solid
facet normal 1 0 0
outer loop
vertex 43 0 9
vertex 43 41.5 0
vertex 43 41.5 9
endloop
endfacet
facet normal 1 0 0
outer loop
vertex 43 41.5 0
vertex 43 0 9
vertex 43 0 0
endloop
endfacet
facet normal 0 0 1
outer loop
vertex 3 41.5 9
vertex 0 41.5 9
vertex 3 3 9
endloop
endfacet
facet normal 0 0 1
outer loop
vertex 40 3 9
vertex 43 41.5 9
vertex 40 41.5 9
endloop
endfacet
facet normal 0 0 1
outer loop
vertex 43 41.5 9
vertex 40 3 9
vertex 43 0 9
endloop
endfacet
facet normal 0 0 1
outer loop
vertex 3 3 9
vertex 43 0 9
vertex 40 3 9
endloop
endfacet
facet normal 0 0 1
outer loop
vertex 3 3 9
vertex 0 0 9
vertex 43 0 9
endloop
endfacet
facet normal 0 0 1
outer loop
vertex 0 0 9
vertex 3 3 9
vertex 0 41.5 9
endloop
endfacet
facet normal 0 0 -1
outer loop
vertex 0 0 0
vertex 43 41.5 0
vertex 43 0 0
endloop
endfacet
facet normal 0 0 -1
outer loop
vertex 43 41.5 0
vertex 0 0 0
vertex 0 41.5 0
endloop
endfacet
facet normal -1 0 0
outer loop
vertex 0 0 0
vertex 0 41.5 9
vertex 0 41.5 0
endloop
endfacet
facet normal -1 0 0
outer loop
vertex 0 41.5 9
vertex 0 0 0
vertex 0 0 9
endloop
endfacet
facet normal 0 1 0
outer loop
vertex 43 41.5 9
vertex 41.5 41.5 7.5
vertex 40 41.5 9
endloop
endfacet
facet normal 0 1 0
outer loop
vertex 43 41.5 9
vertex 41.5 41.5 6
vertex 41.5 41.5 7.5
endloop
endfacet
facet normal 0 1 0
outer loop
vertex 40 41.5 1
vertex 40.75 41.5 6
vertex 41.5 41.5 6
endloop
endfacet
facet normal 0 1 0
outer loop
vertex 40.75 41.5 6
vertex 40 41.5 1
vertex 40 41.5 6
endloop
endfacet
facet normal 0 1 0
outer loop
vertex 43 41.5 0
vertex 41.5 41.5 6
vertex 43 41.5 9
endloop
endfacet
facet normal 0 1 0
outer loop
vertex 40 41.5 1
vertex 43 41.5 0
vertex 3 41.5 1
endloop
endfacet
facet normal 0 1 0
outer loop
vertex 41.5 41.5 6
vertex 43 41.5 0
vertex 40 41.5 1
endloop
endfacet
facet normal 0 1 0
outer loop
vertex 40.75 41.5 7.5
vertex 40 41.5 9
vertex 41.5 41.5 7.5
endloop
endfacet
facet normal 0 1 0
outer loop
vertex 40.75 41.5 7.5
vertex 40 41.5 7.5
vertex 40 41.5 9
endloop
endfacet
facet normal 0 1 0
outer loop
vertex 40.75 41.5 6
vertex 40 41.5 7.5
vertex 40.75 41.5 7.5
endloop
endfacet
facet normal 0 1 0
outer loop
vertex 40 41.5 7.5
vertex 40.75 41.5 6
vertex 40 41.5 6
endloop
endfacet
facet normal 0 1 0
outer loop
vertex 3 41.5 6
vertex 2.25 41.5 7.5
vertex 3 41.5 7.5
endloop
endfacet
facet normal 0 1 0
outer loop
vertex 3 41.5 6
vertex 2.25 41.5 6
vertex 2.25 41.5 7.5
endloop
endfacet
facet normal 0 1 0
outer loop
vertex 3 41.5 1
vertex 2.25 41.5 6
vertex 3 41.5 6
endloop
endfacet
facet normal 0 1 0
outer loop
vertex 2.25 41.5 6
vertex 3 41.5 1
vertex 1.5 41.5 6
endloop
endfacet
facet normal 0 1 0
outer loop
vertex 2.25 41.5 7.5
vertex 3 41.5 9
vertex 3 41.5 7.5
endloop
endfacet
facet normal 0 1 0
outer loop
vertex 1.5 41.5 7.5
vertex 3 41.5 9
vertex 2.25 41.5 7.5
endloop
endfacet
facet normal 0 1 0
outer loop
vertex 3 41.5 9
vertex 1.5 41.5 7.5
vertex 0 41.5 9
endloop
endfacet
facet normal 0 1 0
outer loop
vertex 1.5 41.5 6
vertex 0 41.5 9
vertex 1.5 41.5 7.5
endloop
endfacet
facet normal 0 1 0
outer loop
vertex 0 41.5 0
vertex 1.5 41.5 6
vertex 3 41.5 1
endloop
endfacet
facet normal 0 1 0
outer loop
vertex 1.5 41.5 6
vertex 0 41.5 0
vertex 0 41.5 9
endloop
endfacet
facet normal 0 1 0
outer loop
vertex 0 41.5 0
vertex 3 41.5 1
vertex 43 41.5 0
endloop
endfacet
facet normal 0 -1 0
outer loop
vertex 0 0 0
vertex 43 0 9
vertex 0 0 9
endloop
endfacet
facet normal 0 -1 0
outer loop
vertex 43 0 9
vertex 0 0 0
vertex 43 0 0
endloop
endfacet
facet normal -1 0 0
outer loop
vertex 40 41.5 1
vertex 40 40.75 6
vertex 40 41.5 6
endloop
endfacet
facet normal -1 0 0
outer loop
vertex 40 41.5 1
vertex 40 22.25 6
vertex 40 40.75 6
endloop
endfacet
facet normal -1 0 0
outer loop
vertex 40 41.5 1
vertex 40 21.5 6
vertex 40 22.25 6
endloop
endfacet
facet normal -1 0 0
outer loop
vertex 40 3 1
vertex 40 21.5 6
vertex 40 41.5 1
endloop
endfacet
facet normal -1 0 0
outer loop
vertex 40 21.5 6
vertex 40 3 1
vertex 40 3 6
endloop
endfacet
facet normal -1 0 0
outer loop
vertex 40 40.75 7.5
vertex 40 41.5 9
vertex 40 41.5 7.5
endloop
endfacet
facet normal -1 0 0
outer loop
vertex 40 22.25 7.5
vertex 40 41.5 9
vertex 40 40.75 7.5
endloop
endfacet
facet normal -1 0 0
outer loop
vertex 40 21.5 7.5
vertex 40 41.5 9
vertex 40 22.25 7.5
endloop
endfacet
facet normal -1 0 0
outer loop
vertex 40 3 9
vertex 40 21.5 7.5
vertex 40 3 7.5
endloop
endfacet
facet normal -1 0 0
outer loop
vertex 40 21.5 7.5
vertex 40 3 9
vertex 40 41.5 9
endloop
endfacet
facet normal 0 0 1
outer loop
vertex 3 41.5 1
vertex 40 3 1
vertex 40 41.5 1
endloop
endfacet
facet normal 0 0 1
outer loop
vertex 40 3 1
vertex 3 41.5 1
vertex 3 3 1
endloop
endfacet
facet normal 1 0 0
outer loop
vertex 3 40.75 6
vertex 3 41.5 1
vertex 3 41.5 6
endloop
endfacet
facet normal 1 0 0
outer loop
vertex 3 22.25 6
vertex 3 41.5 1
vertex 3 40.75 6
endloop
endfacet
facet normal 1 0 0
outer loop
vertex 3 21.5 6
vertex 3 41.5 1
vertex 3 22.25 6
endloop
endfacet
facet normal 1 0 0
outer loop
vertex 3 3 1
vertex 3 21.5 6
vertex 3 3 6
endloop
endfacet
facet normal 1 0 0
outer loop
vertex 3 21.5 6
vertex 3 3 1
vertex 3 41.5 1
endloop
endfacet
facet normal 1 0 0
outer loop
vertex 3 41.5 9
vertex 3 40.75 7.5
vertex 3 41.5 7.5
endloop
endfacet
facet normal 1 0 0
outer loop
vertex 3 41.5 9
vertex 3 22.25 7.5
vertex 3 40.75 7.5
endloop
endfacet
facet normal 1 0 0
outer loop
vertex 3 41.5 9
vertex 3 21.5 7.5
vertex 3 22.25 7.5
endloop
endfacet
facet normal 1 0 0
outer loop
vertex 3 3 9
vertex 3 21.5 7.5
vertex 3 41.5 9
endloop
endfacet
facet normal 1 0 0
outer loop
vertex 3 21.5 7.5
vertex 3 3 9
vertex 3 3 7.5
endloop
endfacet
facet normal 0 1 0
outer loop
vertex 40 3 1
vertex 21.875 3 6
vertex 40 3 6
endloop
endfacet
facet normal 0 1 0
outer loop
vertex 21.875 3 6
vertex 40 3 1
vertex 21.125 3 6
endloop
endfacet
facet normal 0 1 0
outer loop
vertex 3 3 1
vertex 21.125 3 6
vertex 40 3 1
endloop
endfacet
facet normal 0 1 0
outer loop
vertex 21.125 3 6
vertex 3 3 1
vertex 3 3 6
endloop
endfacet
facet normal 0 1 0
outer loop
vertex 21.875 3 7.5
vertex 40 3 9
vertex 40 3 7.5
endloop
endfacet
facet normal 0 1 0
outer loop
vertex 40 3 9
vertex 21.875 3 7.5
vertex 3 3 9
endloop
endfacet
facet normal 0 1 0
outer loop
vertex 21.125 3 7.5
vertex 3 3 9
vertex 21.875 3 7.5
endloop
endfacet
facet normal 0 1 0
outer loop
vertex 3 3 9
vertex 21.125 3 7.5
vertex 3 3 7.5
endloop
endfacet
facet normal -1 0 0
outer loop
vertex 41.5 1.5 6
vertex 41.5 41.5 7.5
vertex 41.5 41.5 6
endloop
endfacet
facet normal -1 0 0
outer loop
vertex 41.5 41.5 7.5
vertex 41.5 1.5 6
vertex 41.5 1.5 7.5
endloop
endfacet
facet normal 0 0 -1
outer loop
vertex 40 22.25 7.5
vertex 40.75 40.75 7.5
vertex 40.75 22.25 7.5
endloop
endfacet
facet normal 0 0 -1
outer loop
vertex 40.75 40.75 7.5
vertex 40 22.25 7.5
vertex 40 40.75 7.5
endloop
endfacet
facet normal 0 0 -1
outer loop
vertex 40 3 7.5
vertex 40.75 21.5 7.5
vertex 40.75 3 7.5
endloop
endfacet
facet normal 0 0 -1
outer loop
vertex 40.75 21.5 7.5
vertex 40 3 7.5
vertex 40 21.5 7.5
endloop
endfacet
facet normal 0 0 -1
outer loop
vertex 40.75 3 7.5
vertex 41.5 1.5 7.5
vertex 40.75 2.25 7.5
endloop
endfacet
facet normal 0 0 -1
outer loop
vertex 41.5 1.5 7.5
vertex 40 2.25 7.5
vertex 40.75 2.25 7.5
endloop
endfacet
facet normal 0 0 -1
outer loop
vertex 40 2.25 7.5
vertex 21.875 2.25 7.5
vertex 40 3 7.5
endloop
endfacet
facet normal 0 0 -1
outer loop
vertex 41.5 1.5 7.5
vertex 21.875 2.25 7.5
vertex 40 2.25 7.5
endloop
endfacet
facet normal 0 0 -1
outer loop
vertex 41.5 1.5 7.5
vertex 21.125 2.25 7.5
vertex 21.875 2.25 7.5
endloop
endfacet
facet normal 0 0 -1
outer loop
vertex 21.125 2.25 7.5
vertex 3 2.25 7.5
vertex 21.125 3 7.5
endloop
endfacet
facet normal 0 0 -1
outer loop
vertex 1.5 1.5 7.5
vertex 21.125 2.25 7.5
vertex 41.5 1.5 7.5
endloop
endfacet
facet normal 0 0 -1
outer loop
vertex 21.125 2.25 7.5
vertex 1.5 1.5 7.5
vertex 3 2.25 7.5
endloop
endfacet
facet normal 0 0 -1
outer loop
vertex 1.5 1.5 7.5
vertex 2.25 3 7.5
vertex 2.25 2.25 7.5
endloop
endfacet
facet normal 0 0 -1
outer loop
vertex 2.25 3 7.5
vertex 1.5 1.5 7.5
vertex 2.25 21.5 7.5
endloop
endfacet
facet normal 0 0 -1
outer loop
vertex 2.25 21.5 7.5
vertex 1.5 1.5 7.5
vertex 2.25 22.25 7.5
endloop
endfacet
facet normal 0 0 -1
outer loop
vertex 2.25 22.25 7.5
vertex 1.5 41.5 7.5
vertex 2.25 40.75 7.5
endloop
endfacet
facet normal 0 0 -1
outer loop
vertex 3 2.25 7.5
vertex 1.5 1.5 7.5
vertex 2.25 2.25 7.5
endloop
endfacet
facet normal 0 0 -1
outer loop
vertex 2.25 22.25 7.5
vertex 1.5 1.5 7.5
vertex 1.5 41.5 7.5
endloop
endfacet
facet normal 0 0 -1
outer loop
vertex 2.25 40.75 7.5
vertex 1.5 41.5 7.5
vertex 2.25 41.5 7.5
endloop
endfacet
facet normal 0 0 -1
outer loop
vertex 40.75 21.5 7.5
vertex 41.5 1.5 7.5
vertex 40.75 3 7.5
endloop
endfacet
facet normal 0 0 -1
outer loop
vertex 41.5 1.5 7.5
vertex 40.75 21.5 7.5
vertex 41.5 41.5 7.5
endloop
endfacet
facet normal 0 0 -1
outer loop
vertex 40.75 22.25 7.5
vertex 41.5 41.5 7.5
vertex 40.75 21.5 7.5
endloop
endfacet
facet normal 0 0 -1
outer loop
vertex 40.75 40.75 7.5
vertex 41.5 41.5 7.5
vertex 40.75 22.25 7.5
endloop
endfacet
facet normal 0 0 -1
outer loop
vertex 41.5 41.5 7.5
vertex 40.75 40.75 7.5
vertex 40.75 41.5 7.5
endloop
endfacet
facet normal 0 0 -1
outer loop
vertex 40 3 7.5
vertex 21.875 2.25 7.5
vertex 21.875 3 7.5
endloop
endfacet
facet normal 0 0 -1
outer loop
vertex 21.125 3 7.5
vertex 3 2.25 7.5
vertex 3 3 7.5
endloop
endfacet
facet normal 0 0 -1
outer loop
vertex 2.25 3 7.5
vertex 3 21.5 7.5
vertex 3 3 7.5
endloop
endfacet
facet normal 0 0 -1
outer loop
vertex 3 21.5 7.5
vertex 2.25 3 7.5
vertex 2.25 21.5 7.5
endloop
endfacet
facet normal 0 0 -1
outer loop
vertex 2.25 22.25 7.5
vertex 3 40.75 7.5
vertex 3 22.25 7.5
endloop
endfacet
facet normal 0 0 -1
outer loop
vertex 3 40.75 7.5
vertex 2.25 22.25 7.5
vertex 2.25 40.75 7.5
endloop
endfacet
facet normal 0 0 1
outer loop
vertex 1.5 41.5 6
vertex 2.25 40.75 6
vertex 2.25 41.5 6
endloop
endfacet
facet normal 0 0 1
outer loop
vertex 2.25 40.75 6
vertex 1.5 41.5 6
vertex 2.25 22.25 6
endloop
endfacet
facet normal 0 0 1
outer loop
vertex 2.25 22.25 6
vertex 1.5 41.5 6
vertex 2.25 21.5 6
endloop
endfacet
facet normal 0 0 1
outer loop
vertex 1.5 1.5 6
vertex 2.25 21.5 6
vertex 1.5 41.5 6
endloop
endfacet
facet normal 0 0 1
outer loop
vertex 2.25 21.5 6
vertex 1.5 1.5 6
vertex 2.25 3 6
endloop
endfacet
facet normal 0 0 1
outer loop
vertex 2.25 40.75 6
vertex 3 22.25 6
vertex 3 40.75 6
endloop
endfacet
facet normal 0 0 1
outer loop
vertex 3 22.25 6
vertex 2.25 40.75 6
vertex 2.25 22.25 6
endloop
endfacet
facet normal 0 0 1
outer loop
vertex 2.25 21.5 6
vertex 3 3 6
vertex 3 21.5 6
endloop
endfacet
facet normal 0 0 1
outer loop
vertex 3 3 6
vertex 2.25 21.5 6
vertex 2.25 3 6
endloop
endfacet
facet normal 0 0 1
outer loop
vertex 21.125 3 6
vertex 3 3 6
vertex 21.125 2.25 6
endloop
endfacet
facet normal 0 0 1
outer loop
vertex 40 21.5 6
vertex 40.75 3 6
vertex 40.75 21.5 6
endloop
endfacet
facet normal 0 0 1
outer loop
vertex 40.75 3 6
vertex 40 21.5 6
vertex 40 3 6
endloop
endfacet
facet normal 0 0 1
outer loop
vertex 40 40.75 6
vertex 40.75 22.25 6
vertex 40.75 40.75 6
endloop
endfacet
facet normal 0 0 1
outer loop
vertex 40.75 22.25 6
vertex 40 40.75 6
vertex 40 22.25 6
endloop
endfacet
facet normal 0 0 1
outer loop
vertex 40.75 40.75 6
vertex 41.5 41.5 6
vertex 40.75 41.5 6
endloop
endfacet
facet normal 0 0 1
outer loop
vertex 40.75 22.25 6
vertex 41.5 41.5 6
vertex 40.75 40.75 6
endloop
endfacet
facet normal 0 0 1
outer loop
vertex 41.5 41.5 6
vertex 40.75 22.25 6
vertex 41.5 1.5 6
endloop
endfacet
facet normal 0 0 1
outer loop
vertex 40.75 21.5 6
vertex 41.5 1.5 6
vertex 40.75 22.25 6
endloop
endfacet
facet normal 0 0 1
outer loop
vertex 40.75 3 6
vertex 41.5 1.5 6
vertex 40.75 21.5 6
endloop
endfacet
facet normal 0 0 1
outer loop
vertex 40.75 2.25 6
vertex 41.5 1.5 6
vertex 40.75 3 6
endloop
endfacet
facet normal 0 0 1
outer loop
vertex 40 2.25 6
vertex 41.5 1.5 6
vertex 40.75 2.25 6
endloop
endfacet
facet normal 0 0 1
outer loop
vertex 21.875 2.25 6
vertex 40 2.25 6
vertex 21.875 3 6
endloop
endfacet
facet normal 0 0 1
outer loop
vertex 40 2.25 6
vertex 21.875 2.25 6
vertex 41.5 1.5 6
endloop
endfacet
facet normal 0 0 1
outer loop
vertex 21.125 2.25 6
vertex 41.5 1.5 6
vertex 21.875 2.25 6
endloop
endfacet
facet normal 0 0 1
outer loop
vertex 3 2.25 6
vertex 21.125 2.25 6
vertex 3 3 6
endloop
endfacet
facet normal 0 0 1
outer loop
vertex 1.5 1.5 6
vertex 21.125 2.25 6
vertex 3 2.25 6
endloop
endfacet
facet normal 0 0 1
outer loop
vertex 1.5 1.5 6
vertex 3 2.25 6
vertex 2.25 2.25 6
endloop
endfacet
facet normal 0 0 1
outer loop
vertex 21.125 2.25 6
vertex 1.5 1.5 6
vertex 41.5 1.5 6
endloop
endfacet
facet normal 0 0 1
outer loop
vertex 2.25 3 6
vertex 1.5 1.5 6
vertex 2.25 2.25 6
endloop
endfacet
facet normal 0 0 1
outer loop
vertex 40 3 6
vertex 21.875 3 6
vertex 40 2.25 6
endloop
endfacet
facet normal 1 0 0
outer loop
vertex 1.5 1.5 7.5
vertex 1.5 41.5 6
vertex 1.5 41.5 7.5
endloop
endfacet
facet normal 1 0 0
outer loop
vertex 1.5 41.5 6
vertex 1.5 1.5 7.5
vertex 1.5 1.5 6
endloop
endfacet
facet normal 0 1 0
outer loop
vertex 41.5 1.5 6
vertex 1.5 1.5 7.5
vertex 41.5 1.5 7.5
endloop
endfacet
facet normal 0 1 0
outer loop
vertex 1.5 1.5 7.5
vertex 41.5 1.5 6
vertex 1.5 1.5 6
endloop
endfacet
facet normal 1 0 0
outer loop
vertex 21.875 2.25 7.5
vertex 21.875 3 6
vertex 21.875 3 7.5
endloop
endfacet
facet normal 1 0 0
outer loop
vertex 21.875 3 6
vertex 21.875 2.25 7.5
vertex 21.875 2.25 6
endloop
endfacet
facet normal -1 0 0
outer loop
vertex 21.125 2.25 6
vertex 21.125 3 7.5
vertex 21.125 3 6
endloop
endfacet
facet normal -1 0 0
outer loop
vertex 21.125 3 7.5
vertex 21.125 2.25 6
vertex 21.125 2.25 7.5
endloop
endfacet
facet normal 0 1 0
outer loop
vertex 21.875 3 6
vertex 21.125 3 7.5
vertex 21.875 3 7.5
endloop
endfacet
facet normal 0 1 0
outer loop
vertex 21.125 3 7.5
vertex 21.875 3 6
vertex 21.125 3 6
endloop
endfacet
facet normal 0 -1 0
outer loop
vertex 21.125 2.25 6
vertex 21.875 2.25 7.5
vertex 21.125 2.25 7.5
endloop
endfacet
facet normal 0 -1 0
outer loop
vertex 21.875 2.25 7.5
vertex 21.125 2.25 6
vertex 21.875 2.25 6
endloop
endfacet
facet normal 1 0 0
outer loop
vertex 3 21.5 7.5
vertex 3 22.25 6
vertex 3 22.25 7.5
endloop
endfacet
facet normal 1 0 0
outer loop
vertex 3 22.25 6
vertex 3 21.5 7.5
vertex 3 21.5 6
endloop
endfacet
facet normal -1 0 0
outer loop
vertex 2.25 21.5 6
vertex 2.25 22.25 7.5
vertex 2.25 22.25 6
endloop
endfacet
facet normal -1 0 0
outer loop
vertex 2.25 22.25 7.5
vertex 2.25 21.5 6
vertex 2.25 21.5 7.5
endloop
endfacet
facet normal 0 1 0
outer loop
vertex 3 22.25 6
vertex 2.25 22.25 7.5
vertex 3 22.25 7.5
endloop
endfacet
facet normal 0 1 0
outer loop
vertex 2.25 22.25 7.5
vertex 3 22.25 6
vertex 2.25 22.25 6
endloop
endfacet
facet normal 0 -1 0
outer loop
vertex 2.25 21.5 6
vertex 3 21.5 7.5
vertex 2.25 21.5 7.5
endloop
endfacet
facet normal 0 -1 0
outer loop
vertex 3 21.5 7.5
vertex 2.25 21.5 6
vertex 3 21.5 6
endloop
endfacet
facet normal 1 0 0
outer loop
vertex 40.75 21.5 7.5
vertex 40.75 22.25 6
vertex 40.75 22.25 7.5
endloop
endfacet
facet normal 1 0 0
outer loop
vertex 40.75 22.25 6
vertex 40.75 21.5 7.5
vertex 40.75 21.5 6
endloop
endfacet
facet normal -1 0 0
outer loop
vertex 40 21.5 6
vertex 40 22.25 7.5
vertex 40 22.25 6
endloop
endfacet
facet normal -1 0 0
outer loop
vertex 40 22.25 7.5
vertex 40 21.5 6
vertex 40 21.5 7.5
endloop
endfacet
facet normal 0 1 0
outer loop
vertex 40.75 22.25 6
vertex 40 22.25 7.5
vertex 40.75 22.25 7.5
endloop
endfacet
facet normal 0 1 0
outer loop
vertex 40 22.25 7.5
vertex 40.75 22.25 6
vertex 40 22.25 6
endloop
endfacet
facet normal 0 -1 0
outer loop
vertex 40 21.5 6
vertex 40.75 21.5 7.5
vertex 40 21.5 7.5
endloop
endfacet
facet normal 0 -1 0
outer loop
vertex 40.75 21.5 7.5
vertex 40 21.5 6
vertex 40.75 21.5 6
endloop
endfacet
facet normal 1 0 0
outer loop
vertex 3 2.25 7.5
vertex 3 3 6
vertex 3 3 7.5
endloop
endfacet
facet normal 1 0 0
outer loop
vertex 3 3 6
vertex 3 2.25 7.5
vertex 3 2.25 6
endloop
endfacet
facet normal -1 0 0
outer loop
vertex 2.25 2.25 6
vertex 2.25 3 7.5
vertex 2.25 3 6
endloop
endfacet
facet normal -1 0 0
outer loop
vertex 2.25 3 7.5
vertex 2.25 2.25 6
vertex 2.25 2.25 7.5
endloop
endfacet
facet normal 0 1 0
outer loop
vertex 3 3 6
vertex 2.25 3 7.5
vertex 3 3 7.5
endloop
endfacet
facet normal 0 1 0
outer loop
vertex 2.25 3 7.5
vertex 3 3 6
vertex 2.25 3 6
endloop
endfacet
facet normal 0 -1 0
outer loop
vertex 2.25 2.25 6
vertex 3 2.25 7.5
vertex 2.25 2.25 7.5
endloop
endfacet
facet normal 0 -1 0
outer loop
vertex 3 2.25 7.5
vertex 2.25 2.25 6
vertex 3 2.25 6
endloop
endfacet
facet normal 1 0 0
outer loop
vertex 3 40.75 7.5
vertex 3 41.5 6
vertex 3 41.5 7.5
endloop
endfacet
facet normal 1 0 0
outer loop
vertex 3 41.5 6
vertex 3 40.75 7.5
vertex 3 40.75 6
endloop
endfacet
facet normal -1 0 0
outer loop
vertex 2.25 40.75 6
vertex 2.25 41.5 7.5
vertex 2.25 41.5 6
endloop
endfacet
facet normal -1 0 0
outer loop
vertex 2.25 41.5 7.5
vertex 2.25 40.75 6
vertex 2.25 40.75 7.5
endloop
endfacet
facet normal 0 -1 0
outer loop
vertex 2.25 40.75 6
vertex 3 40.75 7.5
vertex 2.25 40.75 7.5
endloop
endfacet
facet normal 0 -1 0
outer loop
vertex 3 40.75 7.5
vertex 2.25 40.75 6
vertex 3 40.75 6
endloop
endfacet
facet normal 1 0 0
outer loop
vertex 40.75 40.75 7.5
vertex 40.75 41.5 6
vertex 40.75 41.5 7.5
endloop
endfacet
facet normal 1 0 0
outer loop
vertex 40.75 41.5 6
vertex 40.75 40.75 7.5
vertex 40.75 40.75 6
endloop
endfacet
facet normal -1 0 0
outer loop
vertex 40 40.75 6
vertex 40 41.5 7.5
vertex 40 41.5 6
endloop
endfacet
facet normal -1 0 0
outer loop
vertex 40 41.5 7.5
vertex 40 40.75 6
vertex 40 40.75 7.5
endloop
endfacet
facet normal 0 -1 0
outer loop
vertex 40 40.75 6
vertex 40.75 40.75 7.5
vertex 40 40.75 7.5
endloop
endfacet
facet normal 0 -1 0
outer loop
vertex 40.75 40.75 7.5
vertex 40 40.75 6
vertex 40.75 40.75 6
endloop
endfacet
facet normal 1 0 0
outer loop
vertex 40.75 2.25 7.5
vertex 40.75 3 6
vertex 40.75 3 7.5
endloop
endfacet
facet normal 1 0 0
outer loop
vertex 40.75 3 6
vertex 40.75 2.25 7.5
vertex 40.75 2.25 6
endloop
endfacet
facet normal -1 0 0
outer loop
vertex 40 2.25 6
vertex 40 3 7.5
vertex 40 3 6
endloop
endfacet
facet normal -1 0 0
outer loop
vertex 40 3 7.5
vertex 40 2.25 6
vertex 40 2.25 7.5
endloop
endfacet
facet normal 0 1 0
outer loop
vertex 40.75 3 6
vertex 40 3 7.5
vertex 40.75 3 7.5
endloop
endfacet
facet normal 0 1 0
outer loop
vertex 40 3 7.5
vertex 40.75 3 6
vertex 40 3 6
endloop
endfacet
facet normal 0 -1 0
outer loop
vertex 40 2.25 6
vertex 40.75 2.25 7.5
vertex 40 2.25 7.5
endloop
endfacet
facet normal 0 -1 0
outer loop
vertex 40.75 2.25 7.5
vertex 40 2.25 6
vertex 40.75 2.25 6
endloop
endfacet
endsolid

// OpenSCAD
/* [PCB Parameters] */
// PCB Width
pcb_width=40;
// PCB Length (slides in this way)
pcb_length=40;
// PCB Thickness (groove size)
pcb_thickness=1.5; 
// Space between board and shield
pcb_space=5; // [1:20]
// Extra Supports
extra_supports=0; // [0:5]

/* [Shield Parameters] */
// Wall Thickness (
wall_thickness=3;  // [3:7]
// Bottom Thickness
bottom_thickness=1; // [1:7]
// PCB Groove Depth
inset=1.5; // [1,1.5,2]



/* [Hidden] */
// Below are not parameters

wall_thin=wall_thickness - inset;

shield_w = pcb_width + (2 * wall_thin);
shield_l = pcb_length + wall_thin;
shield_h = pcb_space + bottom_thickness + pcb_thickness + wall_thin; 

module shield() {
    cube([shield_w, shield_l, shield_h]);
}

module shield_cut() {
    w = pcb_width - (2*inset);
    l = pcb_length - inset + 0.01;
    h = shield_h - bottom_thickness + 0.01;   
    cube([w, l, h]); 
}

module pcb_cut() {
    cube([pcb_width, pcb_length+0.01, pcb_thickness]);
}

module support() { 
    cube([inset/2,inset/2,pcb_thickness]);
}

module supports() { 
    h = bottom_thickness + pcb_space;
    l1 = wall_thickness - (inset/2);
	l2 = pcb_length + (inset/2);
	w2 = pcb_width;
	
    translate([l1, l1, h]) { support(); }
    translate([l1, l2, h]) { support(); }
    translate([w2, l2, h]) { support(); }
    translate([w2, l1, h]) { support(); }
	
	wd = (w2 - l1);
	ld = (l2 - l1);
	
	for (s = [0 : extra_supports])
	{
		translate([s * (wd / (extra_supports+2)) + (wd / (extra_supports+2)) + l1, l1, h]) { support(); }
		translate([l1, s * (ld / (extra_supports+2)) + (ld / (extra_supports+2)) + l1, h]) { support(); }
		translate([w2, s * (ld / (extra_supports+2)) + (ld / (extra_supports+2)) + l1, h]) { support(); }
	}

}



module part_shield() {
    
	union() { 
		difference()
		{
			shield();
			
			translate([wall_thickness, wall_thickness, bottom_thickness]) {
				shield_cut();
			}
			
			translate([wall_thin, wall_thin, bottom_thickness+pcb_space]) {
				pcb_cut();
			}
		}
		color([1,0,0]) supports();
	}
}

part_shield();
